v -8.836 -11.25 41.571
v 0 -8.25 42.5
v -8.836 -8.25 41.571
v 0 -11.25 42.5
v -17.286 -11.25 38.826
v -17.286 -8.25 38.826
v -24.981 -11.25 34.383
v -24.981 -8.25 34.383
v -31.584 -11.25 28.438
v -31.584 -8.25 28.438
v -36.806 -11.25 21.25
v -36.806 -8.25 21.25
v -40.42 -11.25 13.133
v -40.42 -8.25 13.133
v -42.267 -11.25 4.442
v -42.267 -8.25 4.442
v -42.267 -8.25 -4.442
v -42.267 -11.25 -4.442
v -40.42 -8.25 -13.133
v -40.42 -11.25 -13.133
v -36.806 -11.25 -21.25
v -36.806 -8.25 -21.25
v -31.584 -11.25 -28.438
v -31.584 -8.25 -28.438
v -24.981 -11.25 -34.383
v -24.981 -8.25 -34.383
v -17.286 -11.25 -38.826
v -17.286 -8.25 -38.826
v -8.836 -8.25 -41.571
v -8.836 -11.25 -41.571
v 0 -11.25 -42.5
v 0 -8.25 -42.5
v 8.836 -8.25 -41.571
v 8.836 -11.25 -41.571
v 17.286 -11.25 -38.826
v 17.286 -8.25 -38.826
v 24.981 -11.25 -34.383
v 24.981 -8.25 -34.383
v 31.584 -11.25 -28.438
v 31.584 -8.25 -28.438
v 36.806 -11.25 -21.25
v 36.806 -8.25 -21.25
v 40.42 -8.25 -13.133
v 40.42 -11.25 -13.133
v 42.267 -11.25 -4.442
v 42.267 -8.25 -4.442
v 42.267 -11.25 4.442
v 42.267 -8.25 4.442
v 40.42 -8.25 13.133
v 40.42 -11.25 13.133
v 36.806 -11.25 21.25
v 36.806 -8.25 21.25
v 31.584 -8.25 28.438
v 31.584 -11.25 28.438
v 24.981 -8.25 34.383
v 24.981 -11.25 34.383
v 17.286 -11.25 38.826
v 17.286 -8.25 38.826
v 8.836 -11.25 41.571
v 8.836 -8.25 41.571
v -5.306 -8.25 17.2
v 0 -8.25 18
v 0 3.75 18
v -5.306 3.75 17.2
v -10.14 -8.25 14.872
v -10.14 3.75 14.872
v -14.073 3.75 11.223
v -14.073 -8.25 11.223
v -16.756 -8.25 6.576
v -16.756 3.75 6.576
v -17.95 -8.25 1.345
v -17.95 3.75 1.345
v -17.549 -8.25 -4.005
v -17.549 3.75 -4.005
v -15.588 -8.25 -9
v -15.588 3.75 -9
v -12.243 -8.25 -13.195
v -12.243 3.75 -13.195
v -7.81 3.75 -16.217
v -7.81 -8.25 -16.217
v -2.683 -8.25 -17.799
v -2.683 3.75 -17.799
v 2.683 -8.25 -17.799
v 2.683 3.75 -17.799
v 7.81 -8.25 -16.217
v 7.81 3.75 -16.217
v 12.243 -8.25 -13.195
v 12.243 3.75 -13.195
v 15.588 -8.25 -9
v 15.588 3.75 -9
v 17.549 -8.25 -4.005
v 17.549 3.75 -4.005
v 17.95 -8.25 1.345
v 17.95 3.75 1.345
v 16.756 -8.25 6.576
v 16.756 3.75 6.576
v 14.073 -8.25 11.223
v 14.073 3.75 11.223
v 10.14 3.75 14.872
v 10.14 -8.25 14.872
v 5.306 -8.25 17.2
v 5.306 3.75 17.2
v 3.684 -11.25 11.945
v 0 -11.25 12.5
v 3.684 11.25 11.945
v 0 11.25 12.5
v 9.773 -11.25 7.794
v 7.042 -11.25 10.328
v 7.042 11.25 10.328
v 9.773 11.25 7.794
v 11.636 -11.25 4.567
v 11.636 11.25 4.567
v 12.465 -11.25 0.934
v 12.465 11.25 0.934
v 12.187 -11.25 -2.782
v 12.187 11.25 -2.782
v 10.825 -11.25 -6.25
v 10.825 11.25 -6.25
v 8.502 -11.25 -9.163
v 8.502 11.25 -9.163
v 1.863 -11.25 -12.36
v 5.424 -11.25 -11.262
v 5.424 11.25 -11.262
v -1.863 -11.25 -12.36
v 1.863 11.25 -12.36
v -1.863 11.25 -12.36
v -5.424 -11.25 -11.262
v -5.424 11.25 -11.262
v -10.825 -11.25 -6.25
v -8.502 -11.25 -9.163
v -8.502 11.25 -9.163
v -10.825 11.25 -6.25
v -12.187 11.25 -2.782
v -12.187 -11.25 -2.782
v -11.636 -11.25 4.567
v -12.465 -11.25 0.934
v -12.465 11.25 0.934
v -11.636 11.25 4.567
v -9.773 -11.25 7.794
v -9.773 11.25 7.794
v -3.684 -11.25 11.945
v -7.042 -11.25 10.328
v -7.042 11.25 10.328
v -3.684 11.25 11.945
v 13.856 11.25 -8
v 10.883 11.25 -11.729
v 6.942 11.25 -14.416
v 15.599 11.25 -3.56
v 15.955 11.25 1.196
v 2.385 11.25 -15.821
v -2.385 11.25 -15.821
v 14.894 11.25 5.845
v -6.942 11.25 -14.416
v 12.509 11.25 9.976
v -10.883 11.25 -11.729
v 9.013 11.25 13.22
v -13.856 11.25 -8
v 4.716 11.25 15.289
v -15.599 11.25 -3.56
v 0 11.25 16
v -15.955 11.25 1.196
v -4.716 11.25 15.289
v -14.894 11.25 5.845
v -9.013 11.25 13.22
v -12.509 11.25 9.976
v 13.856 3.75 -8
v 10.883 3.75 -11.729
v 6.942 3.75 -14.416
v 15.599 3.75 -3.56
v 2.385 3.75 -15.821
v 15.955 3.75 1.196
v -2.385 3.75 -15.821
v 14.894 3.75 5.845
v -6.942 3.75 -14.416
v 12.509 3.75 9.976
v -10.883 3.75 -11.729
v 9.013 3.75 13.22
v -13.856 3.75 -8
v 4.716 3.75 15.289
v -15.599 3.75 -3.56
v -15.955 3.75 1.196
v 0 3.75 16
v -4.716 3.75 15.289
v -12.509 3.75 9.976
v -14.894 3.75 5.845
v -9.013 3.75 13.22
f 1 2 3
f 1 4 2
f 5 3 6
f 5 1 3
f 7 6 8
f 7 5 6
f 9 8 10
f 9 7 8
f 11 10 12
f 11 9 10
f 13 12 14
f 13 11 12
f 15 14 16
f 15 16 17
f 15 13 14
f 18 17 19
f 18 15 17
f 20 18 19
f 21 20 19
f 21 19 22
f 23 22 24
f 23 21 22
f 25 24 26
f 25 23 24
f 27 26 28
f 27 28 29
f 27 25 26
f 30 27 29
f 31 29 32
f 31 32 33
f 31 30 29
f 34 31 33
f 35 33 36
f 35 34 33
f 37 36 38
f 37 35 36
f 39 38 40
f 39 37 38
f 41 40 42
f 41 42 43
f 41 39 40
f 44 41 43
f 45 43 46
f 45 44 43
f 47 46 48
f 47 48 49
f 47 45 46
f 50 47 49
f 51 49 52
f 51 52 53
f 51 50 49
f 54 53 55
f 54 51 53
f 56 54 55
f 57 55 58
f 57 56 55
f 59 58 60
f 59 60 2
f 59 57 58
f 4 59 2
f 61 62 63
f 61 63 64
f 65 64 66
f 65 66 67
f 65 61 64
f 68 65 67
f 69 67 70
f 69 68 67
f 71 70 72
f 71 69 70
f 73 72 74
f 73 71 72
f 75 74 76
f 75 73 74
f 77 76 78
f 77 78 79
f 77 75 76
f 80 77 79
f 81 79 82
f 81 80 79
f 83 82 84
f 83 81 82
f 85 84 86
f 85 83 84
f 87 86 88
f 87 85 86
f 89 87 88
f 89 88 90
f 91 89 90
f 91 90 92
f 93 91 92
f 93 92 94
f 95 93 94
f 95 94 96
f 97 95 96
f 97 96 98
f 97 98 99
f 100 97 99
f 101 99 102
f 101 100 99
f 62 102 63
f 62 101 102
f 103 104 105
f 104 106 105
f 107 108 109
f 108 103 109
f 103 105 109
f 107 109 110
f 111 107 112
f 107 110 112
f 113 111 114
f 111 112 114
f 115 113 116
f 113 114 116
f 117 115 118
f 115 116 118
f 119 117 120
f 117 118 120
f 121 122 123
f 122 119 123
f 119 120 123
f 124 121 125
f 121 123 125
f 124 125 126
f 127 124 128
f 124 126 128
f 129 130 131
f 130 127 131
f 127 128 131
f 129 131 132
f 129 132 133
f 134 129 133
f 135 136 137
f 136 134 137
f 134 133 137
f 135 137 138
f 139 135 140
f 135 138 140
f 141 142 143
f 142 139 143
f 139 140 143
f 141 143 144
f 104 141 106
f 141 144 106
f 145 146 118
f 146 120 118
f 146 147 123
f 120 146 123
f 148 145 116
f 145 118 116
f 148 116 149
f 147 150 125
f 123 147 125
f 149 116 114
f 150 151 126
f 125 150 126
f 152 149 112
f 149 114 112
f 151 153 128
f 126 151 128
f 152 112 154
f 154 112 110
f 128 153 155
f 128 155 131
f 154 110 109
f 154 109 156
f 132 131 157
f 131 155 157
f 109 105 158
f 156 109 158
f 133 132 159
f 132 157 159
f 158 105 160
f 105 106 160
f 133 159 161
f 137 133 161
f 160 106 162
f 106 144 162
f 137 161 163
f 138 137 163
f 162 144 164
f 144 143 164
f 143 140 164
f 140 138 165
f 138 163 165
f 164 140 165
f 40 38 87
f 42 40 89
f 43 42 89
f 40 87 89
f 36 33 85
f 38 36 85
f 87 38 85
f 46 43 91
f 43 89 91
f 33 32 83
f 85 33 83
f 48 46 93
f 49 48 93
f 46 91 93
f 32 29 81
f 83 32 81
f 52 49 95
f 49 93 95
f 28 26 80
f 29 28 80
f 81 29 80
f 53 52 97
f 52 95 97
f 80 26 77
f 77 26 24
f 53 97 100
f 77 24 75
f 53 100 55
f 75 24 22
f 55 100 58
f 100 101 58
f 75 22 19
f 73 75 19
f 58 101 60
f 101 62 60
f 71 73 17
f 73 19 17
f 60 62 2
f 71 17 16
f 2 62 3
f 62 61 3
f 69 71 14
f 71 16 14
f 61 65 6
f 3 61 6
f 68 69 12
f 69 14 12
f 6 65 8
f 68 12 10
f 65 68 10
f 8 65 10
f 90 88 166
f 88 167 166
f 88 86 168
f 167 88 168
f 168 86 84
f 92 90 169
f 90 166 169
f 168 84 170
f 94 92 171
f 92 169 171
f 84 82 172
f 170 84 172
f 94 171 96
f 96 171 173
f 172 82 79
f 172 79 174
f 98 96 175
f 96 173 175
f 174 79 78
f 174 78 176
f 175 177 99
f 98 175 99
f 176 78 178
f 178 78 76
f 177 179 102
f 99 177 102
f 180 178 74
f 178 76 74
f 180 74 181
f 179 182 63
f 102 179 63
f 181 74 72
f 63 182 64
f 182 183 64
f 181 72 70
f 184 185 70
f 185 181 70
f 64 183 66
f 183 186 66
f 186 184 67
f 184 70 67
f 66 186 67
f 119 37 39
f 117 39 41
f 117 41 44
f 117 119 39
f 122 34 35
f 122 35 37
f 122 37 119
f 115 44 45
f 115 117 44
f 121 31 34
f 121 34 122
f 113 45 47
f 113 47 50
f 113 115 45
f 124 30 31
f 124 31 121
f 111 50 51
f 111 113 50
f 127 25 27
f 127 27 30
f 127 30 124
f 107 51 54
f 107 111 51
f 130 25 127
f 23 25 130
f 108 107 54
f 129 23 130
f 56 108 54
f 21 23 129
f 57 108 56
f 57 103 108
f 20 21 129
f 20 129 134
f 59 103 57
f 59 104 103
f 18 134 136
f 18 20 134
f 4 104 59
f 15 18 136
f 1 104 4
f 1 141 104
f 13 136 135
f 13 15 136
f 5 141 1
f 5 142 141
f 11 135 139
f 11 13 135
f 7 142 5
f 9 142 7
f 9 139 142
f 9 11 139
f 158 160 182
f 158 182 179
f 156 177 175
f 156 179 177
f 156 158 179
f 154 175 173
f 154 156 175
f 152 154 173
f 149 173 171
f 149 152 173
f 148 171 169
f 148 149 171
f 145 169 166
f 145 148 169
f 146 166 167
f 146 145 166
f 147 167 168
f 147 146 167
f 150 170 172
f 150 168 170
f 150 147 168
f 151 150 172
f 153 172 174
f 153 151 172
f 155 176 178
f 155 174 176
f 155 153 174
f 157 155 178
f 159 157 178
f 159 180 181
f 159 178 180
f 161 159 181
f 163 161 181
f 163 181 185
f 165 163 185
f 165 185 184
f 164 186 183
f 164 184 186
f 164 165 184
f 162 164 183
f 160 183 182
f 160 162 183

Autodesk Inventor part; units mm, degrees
ref_plane "YZ Plane" through (0, 0, 0) normal (1, 0, 0) x (0, 1, 0)
ref_plane "XZ Plane" through (0, 0, 0) normal (0, 1, 0) x (-1, 0, 0)
ref_plane "XY Plane" through (0, 0, 0) normal (0, 0, 1) x (1, 0, 0)
sketch "Sketch1" plane through (0, 0, 0) normal (1, 0, 0) x (0, 1, 0)
  line L0 (11.25, 0) -> (-11.25, 0) construction
  line L1 (-11.25, 12.5) -> (11.25, 12.5)
  line L2 (11.25, 0) -> (-11.25, 0)
  line L3 (-11.25, 12.5) -> (-11.25, 16)
  line L4 (-11.25, 16) -> (11.25, 16)
  line L5 (11.25, 16) -> (11.25, 12.5)
  line L6 (-11.25, 16) -> (3.75, 16)
  line L7 (3.75, 16) -> (3.75, 18)
  line L8 (3.75, 18) -> (-11.25, 18)
  line L9 (-11.25, 18) -> (-11.25, 16)
  line L10 (-11.25, 18) -> (-8.25, 18)
  line L11 (-8.25, 18) -> (-8.25, 42.5)
  line L12 (-8.25, 42.5) -> (-11.25, 42.5)
  line L13 (-11.25, 42.5) -> (-11.25, 18)
  point P0 (0, 0)
  dimension "d0" = 12.5
  dimension "d1" = 0
  dimension "d2" = 22.5
  dimension "d3" = 16
  dimension "d6" = 18
  dimension "d7" = 7.5
  dimension "d8" = 42.5
  dimension "d10" = 11.25
  dimension "d11" = 19.5
revolve "Revolution1" add sketch "Sketch1" angle 360 about axis through (0, 11.25, 0) along (0, -1, 0)
equation "\"d2\" = d4 + d5"
equation "\"d5\" = d4"
equation "\"d4\" = 11.25"
